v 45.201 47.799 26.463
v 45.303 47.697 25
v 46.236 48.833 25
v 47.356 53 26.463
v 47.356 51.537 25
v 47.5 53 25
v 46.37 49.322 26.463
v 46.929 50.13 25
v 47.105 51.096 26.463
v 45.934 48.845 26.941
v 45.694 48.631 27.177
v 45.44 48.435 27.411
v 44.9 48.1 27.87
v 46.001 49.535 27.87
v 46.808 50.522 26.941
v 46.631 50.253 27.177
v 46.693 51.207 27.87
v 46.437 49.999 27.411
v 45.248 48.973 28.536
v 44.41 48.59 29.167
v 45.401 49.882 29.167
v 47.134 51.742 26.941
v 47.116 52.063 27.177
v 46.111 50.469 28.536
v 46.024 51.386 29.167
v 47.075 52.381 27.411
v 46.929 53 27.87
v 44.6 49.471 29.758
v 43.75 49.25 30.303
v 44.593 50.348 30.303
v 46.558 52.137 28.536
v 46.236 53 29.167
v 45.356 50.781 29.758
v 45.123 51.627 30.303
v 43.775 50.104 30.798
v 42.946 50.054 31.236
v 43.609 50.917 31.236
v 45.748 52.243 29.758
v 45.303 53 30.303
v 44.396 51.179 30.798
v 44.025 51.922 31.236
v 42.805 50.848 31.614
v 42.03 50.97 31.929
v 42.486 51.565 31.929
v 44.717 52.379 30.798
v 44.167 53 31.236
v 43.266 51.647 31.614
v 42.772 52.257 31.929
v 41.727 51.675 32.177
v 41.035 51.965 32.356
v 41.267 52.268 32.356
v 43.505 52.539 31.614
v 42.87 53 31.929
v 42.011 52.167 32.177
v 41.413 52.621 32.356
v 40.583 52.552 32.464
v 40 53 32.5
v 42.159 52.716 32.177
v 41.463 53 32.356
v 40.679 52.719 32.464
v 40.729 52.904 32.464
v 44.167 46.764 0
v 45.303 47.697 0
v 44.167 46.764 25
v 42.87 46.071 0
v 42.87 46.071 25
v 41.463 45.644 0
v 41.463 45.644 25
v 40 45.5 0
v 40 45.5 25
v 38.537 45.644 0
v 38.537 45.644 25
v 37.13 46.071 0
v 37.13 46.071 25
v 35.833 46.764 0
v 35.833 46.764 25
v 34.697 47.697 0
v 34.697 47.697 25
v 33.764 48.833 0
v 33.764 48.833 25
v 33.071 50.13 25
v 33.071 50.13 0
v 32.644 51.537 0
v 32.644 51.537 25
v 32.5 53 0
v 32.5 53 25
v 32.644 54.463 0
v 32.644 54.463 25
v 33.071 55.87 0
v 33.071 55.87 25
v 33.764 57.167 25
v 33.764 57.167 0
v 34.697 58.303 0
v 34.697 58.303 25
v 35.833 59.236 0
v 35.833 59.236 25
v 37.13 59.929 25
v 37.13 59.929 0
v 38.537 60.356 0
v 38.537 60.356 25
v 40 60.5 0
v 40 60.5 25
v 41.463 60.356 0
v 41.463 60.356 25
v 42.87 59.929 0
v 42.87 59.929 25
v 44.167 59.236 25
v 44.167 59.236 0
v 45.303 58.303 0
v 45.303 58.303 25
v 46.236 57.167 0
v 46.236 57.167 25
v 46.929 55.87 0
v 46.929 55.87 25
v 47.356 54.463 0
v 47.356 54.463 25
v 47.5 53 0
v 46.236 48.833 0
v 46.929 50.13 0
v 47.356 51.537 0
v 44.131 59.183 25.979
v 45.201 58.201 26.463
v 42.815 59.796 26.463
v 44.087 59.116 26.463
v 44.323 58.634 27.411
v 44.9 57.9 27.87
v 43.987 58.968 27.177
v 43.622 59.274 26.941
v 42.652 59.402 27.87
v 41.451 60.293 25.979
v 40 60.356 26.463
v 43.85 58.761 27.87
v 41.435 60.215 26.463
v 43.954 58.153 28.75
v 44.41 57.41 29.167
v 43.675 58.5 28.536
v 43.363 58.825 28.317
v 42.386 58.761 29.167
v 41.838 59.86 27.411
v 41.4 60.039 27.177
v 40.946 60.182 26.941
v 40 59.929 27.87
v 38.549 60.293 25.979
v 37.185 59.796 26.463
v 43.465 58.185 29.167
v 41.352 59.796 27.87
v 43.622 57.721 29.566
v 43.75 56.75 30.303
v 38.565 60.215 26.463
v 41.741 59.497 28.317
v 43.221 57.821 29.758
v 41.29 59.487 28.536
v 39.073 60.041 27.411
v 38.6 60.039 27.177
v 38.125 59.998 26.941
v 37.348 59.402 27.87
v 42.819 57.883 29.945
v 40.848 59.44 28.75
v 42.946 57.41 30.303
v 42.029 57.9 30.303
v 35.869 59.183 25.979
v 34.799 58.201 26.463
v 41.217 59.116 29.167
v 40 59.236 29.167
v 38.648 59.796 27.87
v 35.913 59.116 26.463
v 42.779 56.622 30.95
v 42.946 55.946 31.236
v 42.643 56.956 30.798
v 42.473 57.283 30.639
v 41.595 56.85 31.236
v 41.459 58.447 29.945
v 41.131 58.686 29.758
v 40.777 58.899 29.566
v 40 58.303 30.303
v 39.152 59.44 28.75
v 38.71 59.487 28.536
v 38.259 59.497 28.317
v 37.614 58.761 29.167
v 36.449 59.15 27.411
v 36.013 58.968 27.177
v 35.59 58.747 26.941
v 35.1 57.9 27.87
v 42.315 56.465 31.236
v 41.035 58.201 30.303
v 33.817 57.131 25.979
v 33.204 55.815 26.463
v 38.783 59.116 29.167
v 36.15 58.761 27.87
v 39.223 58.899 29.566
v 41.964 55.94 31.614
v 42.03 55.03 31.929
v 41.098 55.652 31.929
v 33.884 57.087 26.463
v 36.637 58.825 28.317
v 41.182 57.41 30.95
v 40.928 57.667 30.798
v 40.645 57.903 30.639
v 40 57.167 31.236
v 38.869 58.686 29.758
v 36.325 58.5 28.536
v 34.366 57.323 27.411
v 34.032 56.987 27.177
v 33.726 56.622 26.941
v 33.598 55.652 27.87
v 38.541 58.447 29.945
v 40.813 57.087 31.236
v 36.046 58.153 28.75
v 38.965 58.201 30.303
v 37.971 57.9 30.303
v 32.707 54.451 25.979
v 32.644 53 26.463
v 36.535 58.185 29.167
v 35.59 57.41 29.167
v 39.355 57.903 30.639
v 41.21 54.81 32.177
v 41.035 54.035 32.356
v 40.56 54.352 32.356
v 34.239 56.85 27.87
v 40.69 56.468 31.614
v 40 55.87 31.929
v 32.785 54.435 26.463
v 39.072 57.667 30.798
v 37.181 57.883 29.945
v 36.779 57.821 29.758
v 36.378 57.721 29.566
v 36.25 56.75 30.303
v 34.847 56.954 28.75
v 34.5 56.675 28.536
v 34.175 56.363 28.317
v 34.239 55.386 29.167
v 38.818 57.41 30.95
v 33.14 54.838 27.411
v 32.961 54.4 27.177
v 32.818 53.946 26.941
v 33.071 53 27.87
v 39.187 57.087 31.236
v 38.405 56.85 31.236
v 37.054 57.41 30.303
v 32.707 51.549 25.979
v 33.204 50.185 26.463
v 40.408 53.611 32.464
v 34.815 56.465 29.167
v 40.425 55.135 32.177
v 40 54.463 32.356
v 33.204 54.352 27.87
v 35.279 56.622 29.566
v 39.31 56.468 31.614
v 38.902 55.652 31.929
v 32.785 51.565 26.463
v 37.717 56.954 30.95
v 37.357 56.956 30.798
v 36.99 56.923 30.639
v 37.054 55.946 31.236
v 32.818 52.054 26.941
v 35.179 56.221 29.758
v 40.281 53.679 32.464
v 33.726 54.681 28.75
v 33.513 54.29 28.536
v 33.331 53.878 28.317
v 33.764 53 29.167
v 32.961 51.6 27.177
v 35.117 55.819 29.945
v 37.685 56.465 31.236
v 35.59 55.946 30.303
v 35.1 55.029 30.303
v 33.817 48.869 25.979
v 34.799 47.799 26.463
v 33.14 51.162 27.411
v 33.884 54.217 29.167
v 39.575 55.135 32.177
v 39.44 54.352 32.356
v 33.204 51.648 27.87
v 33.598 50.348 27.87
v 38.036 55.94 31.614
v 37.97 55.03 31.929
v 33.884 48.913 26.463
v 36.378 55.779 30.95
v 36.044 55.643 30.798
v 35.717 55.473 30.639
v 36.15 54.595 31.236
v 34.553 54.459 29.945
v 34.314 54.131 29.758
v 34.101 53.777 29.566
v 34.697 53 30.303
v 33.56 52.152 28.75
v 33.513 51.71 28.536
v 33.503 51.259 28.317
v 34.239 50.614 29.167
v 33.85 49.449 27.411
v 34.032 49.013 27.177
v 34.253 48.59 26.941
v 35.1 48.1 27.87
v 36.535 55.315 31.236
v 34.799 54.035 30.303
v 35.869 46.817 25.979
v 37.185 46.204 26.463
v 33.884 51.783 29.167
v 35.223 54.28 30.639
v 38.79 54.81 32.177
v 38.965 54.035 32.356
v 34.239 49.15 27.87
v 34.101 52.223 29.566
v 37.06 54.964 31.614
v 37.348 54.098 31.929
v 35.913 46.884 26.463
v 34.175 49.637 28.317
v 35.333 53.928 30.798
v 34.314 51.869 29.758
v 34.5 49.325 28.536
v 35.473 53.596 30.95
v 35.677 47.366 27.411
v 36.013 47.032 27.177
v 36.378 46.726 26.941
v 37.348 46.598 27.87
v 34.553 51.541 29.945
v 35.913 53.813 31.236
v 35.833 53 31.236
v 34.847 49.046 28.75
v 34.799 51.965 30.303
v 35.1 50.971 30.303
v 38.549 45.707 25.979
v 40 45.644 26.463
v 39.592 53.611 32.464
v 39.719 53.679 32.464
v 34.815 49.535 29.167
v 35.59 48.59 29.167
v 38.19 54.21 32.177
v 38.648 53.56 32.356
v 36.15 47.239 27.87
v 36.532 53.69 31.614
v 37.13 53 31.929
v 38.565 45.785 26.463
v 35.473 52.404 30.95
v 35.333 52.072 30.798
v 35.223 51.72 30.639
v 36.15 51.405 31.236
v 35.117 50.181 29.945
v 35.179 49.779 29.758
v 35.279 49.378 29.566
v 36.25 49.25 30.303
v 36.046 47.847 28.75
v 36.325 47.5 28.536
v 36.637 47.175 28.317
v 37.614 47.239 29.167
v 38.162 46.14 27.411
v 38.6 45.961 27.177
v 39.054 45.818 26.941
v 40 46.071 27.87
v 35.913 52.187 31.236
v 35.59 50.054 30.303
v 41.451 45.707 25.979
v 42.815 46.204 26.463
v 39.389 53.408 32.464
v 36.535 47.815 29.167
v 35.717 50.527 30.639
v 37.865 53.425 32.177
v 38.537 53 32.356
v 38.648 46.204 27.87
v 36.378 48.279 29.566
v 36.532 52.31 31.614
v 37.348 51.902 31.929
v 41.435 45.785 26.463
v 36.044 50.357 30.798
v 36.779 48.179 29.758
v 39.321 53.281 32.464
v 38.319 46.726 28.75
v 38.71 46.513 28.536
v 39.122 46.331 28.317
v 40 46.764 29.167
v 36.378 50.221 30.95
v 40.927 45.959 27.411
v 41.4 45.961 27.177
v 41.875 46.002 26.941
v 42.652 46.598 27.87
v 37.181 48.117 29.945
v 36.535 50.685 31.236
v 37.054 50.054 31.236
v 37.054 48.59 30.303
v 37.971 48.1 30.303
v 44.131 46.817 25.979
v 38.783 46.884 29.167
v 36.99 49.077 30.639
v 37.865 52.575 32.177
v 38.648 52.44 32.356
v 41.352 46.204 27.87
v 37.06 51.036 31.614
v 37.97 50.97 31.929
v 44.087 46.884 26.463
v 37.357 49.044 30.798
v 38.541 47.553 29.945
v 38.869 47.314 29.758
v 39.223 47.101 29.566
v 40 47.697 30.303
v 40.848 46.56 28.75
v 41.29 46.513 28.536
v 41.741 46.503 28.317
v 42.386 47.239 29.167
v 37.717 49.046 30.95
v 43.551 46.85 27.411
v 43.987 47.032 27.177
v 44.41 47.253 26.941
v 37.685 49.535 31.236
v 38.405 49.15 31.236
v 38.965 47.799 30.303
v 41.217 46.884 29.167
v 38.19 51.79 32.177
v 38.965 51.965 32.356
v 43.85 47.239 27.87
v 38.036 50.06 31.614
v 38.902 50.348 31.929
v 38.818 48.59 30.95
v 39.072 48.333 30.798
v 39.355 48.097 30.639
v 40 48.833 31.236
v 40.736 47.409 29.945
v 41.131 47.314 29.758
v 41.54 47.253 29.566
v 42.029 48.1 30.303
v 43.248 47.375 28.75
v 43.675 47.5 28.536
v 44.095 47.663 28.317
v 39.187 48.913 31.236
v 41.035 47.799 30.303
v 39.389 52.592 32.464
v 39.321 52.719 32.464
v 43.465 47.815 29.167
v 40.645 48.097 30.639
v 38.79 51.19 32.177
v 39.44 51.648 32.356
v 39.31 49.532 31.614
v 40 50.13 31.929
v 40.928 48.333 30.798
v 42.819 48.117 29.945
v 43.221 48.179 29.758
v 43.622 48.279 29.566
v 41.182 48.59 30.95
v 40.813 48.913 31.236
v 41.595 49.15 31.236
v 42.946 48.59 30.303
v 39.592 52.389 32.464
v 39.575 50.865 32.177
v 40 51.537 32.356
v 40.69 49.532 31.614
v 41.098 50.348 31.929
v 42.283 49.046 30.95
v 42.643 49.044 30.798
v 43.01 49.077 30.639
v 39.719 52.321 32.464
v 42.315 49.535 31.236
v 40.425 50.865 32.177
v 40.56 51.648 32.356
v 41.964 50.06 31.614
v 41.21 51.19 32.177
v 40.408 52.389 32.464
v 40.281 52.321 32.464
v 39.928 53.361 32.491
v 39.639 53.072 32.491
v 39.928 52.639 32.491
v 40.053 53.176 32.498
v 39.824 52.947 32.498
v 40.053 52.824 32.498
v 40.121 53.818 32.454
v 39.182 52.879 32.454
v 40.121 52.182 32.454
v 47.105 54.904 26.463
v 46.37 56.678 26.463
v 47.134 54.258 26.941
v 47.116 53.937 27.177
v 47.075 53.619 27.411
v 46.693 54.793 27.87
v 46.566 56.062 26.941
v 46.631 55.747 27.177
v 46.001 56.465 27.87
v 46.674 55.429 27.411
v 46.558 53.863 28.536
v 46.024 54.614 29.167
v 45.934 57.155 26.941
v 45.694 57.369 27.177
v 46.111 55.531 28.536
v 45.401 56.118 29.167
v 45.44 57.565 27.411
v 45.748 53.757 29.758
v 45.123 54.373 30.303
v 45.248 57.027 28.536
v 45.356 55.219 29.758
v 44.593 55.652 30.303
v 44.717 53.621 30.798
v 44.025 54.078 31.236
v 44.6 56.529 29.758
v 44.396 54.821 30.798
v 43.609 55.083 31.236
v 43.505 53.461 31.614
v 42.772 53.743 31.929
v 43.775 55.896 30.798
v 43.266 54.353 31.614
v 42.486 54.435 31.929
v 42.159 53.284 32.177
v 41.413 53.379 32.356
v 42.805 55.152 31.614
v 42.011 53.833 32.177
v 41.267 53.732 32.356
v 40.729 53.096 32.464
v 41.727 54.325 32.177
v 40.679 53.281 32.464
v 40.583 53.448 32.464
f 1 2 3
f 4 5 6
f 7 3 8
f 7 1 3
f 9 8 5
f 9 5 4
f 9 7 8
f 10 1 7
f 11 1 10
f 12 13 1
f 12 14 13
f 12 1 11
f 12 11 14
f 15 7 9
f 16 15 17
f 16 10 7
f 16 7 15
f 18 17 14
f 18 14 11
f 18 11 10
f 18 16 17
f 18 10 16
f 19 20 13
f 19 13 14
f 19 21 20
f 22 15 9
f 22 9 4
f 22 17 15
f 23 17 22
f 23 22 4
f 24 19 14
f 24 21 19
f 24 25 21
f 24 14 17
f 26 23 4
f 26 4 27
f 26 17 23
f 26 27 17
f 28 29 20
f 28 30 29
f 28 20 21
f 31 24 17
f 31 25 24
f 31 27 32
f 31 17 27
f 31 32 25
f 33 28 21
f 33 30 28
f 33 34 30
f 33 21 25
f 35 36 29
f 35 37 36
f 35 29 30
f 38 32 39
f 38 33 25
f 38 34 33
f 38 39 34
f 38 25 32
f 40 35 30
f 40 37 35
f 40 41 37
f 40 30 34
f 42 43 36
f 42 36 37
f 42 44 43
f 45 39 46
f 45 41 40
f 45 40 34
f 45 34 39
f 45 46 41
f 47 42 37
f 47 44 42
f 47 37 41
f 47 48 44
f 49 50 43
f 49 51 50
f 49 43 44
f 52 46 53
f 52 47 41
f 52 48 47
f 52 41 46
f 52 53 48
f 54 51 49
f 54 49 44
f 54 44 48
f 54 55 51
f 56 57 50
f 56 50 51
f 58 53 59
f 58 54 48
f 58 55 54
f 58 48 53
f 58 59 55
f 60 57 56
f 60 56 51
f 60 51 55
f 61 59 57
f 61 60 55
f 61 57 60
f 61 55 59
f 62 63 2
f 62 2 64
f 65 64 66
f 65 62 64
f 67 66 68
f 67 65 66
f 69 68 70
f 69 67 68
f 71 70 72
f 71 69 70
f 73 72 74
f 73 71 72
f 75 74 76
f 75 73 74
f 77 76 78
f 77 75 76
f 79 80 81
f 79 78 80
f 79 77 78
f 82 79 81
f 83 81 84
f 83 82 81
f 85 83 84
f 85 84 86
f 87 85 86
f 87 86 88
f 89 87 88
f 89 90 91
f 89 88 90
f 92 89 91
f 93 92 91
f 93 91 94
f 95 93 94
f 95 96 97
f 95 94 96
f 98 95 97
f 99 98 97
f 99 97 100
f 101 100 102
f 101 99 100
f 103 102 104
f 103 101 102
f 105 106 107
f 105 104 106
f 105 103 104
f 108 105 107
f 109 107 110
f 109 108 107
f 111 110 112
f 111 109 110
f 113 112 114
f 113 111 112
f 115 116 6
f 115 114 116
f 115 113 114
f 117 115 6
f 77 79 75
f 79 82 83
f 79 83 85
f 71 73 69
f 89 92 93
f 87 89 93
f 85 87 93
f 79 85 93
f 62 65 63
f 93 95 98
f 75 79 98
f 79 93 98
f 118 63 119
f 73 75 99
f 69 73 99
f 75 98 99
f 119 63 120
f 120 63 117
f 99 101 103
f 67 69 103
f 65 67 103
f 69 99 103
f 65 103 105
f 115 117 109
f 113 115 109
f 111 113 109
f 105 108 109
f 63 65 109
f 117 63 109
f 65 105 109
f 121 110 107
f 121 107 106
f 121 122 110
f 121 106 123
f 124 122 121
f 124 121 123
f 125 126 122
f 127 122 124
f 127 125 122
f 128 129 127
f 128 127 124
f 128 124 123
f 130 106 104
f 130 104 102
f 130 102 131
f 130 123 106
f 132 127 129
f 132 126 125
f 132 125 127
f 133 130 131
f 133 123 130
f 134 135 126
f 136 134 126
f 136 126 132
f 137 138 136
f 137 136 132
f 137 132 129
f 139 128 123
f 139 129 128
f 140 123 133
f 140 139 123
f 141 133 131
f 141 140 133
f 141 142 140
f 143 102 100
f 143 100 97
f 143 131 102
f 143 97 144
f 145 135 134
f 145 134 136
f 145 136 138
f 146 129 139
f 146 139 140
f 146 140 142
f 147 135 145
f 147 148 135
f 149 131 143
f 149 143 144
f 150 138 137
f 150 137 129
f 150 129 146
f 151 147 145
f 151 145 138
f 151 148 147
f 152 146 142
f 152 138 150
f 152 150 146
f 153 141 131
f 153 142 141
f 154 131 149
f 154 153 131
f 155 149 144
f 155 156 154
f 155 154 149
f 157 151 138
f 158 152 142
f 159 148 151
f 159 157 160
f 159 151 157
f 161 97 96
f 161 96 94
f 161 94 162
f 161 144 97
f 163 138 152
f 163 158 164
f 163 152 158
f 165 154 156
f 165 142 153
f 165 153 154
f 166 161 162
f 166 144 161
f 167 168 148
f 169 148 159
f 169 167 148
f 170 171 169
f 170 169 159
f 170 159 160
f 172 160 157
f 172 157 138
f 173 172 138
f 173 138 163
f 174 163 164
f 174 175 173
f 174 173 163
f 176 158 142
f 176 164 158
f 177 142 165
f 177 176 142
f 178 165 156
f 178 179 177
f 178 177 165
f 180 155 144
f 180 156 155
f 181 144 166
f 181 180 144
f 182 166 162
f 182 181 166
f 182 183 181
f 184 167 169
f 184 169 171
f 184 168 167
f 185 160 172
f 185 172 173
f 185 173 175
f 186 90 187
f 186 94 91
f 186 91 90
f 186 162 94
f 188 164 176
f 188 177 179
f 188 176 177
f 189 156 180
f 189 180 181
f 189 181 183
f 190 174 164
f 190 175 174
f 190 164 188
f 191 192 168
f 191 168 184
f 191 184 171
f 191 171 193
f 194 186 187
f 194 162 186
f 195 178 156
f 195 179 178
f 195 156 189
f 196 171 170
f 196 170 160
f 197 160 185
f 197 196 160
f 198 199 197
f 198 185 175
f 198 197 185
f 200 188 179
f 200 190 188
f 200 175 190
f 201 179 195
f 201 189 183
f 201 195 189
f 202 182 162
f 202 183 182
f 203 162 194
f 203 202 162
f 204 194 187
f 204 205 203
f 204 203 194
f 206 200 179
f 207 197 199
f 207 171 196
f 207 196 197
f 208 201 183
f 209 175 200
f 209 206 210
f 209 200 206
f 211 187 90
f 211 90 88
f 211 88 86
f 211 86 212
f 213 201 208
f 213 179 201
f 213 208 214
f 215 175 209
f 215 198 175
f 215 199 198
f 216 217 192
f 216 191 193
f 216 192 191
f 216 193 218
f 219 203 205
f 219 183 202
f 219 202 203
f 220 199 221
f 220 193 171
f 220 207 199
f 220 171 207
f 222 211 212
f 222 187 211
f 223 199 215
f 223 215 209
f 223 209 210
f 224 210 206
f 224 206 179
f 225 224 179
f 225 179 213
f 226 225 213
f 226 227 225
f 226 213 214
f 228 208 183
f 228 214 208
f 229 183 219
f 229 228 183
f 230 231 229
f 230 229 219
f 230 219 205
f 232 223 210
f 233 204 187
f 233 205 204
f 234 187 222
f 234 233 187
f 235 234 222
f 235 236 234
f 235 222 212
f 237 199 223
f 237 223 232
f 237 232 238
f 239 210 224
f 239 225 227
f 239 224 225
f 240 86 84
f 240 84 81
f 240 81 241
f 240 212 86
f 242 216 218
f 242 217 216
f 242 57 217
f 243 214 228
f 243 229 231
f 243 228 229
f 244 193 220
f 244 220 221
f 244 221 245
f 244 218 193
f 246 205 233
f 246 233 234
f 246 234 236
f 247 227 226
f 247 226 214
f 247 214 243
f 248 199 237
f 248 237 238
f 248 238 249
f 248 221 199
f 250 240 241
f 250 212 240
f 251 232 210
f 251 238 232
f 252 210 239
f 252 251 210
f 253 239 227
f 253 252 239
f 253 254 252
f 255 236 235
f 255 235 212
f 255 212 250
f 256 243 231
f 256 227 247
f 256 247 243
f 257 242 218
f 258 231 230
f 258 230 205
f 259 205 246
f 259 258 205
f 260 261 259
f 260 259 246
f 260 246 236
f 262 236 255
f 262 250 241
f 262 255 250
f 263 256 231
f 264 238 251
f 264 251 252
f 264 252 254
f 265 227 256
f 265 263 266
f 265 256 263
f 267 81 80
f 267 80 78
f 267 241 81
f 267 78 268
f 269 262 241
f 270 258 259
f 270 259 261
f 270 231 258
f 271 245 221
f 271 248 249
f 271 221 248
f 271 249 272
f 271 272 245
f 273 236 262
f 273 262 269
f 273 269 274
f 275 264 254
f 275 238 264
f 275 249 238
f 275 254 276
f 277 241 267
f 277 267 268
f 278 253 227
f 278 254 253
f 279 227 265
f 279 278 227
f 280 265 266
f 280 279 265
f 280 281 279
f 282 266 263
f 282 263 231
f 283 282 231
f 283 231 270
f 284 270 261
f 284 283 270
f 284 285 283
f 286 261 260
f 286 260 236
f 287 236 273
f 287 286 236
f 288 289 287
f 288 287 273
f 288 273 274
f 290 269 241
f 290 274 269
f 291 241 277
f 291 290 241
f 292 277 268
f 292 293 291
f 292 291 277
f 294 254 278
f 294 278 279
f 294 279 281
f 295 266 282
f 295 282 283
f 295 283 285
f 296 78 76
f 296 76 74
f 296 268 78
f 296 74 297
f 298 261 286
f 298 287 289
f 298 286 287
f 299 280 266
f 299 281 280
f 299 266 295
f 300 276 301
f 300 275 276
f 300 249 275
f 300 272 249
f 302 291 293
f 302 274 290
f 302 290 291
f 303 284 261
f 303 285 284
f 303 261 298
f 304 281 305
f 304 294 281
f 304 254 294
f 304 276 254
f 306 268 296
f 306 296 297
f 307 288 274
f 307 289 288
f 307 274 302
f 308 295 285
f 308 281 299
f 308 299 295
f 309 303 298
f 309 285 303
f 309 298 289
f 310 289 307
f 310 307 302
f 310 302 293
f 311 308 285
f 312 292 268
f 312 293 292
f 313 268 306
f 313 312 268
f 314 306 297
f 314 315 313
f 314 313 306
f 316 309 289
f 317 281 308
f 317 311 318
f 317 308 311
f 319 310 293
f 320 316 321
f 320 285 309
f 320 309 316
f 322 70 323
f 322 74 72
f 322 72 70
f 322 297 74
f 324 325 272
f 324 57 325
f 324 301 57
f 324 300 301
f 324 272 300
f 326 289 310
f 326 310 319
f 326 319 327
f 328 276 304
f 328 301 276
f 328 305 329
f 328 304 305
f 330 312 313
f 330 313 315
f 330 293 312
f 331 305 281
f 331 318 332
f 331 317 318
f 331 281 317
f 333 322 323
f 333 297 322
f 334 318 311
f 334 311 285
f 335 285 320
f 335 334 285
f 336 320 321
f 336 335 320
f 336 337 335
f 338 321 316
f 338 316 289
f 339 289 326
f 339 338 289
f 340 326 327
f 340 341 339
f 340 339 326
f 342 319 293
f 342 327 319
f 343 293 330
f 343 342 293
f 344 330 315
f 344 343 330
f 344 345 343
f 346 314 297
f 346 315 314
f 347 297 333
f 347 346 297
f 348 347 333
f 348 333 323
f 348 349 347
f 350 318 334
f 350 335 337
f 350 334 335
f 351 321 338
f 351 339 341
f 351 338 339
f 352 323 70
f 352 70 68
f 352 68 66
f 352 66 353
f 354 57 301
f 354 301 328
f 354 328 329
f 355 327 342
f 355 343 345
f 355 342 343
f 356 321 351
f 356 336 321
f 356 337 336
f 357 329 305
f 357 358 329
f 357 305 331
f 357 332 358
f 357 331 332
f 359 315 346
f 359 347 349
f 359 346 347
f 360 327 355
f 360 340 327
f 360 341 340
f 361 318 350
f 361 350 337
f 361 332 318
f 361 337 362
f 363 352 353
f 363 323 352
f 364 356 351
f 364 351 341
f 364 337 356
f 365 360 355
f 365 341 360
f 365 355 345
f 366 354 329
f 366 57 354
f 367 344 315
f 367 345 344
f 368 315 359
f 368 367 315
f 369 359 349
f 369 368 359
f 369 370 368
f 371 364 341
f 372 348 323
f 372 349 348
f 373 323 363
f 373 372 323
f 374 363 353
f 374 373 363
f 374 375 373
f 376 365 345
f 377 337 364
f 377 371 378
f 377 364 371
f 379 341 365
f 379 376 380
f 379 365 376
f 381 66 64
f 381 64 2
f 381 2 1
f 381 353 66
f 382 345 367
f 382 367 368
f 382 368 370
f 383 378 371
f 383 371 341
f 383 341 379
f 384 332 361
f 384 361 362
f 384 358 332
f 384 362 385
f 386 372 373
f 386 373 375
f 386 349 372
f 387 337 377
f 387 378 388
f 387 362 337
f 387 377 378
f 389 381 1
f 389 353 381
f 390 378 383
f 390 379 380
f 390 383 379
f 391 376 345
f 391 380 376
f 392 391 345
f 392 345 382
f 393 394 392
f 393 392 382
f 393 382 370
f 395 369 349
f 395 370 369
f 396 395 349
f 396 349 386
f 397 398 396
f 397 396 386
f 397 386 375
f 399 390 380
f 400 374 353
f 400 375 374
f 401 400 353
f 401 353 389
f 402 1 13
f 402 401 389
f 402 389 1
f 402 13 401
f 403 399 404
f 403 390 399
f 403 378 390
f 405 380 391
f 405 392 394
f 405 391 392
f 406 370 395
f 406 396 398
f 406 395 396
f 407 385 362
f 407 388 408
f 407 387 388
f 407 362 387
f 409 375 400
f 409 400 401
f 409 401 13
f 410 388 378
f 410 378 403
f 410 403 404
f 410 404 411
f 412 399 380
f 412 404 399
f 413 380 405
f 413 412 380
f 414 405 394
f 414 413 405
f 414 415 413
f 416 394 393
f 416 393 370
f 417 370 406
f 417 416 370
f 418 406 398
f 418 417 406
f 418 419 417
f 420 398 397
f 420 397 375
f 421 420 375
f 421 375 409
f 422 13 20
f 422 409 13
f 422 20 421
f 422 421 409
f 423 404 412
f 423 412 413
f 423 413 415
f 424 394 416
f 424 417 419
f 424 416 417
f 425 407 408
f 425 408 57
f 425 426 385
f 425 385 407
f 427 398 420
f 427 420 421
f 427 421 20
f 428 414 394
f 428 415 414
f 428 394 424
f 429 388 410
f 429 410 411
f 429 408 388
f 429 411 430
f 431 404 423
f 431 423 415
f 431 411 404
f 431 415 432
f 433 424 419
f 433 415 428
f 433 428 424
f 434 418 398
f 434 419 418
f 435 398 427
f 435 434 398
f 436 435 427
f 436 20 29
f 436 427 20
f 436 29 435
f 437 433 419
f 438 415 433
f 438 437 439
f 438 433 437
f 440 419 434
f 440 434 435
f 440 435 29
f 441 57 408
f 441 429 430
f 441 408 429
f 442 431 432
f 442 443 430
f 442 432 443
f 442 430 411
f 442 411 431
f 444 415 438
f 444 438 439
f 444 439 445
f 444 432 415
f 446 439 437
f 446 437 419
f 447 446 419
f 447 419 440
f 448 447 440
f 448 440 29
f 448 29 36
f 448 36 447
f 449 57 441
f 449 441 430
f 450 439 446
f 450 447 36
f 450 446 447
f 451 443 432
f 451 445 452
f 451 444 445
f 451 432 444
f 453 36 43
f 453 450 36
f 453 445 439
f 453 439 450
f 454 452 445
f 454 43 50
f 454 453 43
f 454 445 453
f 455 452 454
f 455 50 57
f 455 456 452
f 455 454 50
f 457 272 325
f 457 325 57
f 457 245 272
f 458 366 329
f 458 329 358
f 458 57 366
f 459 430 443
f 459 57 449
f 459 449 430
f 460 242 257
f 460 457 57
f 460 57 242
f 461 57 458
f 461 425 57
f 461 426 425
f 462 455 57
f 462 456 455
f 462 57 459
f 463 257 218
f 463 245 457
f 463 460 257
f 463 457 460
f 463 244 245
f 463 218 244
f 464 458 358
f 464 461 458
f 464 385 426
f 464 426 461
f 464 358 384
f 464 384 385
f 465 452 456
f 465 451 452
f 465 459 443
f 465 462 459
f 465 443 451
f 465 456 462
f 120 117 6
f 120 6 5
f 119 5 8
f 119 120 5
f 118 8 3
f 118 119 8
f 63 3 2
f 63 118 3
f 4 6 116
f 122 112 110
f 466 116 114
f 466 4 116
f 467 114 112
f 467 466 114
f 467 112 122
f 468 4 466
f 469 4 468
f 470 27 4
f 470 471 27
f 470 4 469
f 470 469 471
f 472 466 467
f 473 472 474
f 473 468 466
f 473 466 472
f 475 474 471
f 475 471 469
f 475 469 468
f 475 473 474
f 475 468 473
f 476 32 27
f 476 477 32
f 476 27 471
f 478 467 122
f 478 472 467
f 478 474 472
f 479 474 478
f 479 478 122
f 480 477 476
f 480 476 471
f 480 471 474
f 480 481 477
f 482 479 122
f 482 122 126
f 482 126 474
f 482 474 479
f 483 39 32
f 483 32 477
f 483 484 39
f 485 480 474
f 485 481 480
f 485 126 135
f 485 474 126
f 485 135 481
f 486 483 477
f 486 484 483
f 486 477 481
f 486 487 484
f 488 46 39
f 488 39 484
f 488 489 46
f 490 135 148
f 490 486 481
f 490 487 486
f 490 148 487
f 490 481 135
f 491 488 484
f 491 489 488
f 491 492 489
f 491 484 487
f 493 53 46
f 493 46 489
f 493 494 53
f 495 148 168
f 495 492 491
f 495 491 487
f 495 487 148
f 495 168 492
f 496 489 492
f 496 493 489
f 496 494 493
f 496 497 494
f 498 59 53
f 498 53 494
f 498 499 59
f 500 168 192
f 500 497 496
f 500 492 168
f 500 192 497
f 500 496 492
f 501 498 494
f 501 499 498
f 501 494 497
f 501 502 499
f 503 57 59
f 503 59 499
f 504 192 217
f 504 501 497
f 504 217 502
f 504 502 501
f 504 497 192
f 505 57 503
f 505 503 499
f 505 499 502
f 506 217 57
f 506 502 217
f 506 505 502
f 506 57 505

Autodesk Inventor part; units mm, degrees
ref_plane "YZ Plane" through (0, 0, 0) normal (1, 0, 0) x (0, 1, 0)
ref_plane "XZ Plane" through (0, 0, 0) normal (0, 1, 0) x (-1, 0, 0)
ref_plane "XY Plane" through (0, 0, 0) normal (0, 0, 1) x (1, 0, 0)
sketch "Sketch1" plane through (0, 0, 0) normal (0, 0, 1) x (1, 0, 0)
  arc A0 (45.3033, 58.3033) -> (45.3033, 47.6967) centre (40, 53) ccw projected
  circle A1 centre (40, 53) radius 7.5
  point P0 (0, 0)
extrude "Extrusion1" add sketch "Sketch1" along normal blind 32.5
fillet "Fillet1" radius 7.5 1 edges at (32.5, 53, 32.5)
properties part number "NotchPiston1"
